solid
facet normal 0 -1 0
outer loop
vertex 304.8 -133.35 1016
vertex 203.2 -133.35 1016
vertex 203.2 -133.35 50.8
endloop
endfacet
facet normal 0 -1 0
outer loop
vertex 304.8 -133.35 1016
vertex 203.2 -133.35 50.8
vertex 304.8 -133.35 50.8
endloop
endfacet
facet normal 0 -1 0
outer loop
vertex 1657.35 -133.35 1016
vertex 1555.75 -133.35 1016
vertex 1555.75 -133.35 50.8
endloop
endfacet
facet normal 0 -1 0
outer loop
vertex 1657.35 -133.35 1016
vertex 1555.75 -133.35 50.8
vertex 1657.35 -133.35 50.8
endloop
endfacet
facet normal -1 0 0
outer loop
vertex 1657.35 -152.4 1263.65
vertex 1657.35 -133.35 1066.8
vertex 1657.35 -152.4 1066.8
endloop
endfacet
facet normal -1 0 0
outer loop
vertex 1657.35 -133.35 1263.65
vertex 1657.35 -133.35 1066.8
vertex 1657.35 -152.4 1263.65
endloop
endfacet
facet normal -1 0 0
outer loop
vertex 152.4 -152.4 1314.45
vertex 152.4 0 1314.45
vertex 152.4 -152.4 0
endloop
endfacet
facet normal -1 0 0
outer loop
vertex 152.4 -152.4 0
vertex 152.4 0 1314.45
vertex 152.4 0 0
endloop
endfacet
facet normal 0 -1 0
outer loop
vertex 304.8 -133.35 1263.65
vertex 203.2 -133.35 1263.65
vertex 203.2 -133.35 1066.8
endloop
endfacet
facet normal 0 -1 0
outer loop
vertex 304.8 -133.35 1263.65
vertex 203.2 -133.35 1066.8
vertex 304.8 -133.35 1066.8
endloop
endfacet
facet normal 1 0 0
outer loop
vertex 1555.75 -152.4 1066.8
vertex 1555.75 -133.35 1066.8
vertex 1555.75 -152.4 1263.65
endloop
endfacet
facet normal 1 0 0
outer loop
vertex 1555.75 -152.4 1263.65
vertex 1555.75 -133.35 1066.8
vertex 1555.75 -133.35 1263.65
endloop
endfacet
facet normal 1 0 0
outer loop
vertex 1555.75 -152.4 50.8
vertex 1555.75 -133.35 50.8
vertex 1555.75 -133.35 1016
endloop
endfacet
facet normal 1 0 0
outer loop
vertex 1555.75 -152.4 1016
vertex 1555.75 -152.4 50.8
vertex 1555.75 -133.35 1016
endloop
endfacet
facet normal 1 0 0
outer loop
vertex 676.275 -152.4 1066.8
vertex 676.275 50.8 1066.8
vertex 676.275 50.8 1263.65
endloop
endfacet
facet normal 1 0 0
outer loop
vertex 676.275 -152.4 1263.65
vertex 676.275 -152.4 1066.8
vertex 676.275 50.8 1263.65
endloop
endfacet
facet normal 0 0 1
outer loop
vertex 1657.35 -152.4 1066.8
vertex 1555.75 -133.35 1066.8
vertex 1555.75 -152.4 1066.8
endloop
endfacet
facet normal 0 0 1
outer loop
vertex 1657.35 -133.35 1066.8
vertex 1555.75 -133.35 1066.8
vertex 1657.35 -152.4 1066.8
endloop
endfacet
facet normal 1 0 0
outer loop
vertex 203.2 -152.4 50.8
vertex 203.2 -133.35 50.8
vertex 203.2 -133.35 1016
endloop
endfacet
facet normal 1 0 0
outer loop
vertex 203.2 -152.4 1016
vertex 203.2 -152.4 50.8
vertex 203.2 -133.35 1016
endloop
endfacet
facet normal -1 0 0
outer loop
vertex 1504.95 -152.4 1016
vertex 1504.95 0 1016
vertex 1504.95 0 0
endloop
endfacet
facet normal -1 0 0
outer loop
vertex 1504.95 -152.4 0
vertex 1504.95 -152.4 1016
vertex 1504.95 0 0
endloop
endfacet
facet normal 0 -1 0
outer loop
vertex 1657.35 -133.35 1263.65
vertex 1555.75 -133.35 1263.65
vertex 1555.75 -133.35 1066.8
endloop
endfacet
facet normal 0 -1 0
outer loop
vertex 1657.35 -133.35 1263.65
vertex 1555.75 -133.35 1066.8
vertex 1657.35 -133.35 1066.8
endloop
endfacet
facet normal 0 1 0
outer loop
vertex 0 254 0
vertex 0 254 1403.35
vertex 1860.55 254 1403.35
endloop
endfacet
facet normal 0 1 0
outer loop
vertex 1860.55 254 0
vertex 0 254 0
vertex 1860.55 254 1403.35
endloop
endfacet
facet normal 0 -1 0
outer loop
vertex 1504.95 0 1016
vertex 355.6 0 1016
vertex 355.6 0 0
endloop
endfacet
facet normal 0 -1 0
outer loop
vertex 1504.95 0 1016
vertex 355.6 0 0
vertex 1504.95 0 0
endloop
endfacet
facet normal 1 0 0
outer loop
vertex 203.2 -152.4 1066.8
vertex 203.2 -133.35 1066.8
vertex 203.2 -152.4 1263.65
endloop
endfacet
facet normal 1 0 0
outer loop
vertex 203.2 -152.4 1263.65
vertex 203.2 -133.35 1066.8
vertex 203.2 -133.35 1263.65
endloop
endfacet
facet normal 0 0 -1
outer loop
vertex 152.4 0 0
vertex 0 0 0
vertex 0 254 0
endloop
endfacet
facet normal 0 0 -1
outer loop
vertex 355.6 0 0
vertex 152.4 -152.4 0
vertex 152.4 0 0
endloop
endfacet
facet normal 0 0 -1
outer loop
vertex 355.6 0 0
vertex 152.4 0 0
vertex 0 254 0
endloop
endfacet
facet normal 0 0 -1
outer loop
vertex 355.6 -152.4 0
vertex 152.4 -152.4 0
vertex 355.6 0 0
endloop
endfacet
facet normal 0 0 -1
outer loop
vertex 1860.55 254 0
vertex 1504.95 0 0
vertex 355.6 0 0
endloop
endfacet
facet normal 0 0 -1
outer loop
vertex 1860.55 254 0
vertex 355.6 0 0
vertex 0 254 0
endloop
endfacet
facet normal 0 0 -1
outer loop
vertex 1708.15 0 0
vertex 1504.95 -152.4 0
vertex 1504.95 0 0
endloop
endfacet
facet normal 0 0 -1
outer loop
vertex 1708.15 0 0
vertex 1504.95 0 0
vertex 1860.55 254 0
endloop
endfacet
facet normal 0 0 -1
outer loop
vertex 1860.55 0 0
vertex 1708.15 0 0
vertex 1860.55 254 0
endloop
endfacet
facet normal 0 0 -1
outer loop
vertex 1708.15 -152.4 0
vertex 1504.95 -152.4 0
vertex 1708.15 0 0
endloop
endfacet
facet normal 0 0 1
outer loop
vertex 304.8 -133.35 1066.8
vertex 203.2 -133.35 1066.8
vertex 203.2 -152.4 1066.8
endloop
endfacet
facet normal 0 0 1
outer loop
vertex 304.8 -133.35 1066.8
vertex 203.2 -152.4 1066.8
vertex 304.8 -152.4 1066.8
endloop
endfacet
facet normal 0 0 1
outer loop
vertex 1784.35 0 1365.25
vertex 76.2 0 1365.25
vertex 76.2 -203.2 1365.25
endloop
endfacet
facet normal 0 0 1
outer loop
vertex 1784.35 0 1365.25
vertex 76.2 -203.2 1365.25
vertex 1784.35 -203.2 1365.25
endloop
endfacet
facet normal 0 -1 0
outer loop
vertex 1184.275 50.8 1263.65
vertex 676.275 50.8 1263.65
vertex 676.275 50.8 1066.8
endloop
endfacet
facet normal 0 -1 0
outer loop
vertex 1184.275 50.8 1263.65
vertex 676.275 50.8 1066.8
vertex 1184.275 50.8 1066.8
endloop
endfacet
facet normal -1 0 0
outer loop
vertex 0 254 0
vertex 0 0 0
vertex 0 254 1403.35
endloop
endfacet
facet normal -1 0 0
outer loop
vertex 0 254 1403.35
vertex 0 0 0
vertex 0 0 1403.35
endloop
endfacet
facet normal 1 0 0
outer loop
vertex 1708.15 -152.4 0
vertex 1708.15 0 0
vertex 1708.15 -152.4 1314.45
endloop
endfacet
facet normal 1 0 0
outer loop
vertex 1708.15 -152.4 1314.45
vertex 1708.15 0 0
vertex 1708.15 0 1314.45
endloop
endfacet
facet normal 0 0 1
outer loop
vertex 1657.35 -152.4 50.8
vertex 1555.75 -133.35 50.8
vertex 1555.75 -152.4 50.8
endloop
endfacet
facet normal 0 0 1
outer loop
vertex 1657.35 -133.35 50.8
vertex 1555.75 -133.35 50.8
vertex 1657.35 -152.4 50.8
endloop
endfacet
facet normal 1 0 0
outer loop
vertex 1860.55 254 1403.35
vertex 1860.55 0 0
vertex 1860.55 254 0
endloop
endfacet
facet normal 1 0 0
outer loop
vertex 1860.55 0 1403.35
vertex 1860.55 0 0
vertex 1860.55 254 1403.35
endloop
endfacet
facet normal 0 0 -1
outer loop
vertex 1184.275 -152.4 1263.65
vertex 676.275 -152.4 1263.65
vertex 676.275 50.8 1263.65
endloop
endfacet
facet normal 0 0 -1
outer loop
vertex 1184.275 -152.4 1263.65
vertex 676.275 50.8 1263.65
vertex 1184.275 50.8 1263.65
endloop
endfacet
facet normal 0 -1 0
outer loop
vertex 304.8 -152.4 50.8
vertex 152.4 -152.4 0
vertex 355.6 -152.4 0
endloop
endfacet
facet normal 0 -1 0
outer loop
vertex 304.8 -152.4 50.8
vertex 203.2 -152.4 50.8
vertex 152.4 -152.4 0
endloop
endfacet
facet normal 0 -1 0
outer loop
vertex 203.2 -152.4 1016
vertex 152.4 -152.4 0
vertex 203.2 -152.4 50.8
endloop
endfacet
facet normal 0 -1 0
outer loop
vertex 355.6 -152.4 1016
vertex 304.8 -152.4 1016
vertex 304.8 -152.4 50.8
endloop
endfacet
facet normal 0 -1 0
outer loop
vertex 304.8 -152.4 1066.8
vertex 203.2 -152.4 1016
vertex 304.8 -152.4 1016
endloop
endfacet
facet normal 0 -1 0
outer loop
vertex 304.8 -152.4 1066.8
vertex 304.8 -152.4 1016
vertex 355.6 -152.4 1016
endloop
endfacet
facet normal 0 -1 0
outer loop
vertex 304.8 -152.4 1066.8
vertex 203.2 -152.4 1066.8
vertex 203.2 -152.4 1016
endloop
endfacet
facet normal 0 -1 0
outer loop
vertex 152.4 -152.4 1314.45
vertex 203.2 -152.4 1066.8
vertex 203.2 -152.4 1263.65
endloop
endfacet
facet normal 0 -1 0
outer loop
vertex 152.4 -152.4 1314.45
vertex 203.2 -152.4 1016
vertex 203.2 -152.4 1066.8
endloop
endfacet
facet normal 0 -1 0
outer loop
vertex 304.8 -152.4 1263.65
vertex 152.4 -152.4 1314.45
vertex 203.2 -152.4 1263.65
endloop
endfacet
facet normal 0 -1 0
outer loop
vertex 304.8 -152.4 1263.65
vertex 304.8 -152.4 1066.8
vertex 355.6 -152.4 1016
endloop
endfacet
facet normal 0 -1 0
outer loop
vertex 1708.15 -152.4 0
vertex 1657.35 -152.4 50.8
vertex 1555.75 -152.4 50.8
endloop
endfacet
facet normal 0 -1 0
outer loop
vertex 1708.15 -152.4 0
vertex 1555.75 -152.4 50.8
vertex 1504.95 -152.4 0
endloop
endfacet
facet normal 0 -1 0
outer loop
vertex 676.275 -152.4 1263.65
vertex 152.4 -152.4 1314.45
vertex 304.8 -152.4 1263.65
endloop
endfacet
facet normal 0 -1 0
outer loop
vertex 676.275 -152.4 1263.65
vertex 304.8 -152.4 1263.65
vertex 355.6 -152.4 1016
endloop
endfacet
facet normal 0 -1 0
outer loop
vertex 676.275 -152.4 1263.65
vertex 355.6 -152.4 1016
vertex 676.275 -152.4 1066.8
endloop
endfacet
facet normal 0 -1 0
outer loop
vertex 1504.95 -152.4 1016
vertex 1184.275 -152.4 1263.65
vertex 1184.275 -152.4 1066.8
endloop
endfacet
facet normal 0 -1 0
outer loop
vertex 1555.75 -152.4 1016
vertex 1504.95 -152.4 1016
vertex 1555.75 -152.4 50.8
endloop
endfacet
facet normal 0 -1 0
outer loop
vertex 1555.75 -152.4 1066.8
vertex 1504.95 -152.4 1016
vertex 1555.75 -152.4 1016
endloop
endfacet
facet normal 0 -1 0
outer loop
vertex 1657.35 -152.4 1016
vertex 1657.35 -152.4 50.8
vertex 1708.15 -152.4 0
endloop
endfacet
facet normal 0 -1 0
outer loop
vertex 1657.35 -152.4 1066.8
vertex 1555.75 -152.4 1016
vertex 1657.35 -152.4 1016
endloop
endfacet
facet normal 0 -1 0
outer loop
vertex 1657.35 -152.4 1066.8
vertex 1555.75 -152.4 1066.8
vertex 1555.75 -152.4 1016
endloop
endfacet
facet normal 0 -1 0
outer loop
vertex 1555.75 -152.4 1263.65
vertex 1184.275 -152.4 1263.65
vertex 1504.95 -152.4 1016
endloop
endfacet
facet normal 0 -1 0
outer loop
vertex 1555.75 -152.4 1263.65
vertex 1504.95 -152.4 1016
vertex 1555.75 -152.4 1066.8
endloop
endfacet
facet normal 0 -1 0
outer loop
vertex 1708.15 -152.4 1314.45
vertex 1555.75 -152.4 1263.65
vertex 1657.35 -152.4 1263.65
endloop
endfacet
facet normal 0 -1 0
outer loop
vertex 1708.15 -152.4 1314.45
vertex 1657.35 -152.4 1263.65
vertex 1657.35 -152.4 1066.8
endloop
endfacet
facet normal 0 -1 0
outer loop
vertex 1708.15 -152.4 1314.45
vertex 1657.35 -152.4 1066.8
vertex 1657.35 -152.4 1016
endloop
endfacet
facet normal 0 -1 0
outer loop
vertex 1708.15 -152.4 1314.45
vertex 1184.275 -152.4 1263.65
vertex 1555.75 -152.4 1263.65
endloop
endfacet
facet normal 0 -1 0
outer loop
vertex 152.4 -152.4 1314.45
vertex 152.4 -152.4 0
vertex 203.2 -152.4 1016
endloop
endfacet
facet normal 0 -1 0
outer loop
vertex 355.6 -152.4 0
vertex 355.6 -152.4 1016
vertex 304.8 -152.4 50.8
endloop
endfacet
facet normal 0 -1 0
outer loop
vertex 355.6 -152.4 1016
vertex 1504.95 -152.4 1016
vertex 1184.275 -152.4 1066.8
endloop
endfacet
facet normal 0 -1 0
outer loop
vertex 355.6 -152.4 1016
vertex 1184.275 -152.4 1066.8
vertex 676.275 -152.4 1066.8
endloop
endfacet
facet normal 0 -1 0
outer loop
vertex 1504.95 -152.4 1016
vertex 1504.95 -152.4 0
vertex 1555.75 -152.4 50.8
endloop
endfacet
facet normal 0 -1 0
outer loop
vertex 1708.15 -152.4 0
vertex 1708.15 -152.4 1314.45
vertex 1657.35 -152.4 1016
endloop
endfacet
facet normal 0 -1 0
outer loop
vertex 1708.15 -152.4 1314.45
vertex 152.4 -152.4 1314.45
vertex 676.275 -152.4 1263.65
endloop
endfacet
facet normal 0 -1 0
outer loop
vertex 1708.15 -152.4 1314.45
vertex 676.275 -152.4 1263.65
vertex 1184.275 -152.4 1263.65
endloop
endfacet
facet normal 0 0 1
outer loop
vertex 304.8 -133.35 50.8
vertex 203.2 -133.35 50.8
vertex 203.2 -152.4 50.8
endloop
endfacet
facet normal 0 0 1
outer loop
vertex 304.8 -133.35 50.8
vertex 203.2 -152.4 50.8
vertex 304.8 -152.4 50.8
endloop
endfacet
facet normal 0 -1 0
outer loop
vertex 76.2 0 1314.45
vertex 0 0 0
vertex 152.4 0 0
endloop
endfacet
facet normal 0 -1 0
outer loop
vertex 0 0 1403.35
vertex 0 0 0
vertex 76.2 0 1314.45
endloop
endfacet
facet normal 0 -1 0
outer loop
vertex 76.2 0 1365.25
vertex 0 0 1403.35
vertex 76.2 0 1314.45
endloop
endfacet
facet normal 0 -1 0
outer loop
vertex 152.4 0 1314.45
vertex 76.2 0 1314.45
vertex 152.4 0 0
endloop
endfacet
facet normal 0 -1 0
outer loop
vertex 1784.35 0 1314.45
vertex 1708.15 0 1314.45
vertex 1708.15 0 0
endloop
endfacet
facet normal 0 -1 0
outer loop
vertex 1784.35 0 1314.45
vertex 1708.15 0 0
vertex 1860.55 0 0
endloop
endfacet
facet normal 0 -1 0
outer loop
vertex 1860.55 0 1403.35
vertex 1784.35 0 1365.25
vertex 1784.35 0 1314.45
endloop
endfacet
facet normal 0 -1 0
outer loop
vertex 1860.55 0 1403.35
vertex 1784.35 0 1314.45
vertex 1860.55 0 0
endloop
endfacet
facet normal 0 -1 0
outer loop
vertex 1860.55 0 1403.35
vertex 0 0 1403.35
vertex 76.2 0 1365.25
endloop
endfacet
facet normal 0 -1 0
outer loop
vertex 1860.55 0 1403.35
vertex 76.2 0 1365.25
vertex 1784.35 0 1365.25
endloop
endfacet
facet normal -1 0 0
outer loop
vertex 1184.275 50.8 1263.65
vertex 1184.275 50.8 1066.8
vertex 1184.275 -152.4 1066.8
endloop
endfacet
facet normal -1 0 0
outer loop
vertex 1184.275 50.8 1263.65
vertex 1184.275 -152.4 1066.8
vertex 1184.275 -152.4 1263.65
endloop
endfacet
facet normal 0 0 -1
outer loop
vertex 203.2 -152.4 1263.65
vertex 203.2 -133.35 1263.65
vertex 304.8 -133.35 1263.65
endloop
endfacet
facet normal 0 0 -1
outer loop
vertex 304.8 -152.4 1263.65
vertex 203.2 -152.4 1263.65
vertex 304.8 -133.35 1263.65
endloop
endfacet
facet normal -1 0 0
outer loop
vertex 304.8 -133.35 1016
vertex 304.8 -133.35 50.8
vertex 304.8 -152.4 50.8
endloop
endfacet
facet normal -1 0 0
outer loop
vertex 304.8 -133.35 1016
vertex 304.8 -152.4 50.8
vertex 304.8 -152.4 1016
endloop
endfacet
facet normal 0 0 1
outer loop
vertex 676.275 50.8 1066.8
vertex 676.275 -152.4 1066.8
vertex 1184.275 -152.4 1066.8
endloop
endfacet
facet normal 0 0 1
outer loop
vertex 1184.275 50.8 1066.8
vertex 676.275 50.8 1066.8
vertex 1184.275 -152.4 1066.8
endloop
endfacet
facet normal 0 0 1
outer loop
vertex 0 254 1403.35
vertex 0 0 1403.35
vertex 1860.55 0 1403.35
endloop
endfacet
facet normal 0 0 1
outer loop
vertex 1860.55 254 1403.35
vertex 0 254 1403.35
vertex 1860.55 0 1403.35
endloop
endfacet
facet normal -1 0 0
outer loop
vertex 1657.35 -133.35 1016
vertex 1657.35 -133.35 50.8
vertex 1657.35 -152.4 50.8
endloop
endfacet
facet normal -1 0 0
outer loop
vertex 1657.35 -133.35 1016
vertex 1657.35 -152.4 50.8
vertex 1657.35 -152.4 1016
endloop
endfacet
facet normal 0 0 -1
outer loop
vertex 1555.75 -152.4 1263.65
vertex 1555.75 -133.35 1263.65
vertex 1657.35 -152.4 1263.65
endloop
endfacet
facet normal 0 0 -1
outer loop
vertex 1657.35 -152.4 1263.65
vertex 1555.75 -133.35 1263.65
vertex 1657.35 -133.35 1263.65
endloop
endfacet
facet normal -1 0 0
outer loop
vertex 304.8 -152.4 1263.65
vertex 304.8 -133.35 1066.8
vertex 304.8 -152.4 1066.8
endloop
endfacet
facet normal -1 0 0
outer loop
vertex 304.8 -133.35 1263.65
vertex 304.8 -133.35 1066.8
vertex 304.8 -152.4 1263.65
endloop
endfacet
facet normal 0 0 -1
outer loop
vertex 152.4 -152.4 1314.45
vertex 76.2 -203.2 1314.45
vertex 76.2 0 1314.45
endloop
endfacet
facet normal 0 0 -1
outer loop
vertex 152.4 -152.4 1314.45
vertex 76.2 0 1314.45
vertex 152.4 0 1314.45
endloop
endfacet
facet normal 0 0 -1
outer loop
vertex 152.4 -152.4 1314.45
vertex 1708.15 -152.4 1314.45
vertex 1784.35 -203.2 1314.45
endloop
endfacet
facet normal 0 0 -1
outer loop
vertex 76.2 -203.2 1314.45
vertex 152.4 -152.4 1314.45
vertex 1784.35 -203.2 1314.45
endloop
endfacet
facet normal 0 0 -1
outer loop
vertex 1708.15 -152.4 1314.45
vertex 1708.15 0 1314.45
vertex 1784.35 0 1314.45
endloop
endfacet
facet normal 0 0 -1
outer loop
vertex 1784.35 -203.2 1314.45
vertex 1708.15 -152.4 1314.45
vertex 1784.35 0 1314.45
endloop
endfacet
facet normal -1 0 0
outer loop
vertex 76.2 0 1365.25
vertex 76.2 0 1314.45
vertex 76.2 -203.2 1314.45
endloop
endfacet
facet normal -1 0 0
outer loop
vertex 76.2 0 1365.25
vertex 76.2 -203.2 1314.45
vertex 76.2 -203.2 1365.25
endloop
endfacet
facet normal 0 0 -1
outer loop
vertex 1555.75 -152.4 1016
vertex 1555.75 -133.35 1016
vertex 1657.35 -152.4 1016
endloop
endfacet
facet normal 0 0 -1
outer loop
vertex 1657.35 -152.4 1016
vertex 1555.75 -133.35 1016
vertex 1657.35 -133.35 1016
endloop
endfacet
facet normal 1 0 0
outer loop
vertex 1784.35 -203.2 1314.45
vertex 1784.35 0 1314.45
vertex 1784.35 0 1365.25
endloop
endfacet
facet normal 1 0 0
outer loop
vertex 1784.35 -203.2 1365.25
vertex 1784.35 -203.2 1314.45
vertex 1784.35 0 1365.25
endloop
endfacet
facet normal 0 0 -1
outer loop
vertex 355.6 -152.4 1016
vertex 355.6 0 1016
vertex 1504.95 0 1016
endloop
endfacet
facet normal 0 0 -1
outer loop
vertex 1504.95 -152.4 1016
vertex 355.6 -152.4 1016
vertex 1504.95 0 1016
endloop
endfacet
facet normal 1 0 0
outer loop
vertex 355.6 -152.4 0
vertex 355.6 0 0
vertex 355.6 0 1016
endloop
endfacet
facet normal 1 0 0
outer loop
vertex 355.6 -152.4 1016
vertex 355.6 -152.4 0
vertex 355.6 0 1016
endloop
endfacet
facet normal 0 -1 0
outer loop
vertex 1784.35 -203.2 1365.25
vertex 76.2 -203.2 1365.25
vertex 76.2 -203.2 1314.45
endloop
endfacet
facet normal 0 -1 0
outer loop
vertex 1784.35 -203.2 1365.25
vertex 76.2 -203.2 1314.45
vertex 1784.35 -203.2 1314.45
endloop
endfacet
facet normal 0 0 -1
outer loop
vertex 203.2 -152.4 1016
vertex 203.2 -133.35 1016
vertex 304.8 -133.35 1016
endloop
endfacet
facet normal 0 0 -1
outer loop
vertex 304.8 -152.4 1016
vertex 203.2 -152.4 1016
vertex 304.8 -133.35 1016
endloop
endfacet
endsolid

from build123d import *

# Parameters (mm, degrees)
F0_W      = 1860.55
F0_H      = 1403.35
F2_DEPTH  = 254
F3_W      = 1708.15
F3_H      = 50.8
F4_DEPTH  = 203.2
F5_W      = 101.6
F5_H      = 965.2
F5_H_2    = 196.85
F6_DEPTH  = 152.4
F7_W      = 508
F7_H      = 196.85
F8_DEPTH  = 203.2
F9_W      = 101.6
F9_H      = 965.2
F9_H_2    = 196.85
F10_DEPTH = 133.35


with BuildPart() as f2:
    # F0 (on Front) → F2 (new body)
    with BuildSketch(Plane.XZ):
        with Locations((930.275, 701.675)):
            Rectangle(F0_W, F0_H)
    extrude(amount=-F2_DEPTH)

    # F3 (on face) → F4 (join)
    with BuildSketch(Plane.XZ):
        with Locations((930.275, 1339.85)):
            Rectangle(F3_W, F3_H)
    extrude(amount=F4_DEPTH)

    # F5 (on face) → F6 (join)
    with BuildSketch(Plane.XZ):
        Polygon((152.4, 1314.45), (152.4, 0), (355.6, 0), (355.6, 1016), (1504.95, 1016), (1504.95, 0), (1708.15, 0), (1708.15, 1314.45), align=None)
        with Locations((254, 533.4)):
            Rectangle(F5_W, F5_H, mode=Mode.SUBTRACT)
        with Locations((1606.55, 533.4)):
            Rectangle(F5_W, F5_H, mode=Mode.SUBTRACT)
        with Locations((254, 1165.225)):
            Rectangle(F5_W, F5_H_2, mode=Mode.SUBTRACT)
        with Locations((1606.55, 1165.225)):
            Rectangle(F5_W, F5_H_2, mode=Mode.SUBTRACT)
    extrude(amount=F6_DEPTH)

    # F7 (on face) → F8 (cut)
    with BuildSketch(Plane.XZ.offset(152.4)):
        with Locations((930.275, 1165.225)):
            Rectangle(F7_W, F7_H)
    extrude(amount=-F8_DEPTH, mode=Mode.SUBTRACT)

    # F9 (on face) → F10 (join)
    with BuildSketch(Plane.XZ):
        with Locations((254, 533.4)):
            Rectangle(F9_W, F9_H)
        with Locations((254, 1165.225)):
            Rectangle(F9_W, F9_H_2)
        with Locations((1606.55, 1165.225)):
            Rectangle(F9_W, F9_H_2)
        with Locations((1606.55, 533.4)):
            Rectangle(F9_W, F9_H)
    extrude(amount=F10_DEPTH)


solid = f2.part
